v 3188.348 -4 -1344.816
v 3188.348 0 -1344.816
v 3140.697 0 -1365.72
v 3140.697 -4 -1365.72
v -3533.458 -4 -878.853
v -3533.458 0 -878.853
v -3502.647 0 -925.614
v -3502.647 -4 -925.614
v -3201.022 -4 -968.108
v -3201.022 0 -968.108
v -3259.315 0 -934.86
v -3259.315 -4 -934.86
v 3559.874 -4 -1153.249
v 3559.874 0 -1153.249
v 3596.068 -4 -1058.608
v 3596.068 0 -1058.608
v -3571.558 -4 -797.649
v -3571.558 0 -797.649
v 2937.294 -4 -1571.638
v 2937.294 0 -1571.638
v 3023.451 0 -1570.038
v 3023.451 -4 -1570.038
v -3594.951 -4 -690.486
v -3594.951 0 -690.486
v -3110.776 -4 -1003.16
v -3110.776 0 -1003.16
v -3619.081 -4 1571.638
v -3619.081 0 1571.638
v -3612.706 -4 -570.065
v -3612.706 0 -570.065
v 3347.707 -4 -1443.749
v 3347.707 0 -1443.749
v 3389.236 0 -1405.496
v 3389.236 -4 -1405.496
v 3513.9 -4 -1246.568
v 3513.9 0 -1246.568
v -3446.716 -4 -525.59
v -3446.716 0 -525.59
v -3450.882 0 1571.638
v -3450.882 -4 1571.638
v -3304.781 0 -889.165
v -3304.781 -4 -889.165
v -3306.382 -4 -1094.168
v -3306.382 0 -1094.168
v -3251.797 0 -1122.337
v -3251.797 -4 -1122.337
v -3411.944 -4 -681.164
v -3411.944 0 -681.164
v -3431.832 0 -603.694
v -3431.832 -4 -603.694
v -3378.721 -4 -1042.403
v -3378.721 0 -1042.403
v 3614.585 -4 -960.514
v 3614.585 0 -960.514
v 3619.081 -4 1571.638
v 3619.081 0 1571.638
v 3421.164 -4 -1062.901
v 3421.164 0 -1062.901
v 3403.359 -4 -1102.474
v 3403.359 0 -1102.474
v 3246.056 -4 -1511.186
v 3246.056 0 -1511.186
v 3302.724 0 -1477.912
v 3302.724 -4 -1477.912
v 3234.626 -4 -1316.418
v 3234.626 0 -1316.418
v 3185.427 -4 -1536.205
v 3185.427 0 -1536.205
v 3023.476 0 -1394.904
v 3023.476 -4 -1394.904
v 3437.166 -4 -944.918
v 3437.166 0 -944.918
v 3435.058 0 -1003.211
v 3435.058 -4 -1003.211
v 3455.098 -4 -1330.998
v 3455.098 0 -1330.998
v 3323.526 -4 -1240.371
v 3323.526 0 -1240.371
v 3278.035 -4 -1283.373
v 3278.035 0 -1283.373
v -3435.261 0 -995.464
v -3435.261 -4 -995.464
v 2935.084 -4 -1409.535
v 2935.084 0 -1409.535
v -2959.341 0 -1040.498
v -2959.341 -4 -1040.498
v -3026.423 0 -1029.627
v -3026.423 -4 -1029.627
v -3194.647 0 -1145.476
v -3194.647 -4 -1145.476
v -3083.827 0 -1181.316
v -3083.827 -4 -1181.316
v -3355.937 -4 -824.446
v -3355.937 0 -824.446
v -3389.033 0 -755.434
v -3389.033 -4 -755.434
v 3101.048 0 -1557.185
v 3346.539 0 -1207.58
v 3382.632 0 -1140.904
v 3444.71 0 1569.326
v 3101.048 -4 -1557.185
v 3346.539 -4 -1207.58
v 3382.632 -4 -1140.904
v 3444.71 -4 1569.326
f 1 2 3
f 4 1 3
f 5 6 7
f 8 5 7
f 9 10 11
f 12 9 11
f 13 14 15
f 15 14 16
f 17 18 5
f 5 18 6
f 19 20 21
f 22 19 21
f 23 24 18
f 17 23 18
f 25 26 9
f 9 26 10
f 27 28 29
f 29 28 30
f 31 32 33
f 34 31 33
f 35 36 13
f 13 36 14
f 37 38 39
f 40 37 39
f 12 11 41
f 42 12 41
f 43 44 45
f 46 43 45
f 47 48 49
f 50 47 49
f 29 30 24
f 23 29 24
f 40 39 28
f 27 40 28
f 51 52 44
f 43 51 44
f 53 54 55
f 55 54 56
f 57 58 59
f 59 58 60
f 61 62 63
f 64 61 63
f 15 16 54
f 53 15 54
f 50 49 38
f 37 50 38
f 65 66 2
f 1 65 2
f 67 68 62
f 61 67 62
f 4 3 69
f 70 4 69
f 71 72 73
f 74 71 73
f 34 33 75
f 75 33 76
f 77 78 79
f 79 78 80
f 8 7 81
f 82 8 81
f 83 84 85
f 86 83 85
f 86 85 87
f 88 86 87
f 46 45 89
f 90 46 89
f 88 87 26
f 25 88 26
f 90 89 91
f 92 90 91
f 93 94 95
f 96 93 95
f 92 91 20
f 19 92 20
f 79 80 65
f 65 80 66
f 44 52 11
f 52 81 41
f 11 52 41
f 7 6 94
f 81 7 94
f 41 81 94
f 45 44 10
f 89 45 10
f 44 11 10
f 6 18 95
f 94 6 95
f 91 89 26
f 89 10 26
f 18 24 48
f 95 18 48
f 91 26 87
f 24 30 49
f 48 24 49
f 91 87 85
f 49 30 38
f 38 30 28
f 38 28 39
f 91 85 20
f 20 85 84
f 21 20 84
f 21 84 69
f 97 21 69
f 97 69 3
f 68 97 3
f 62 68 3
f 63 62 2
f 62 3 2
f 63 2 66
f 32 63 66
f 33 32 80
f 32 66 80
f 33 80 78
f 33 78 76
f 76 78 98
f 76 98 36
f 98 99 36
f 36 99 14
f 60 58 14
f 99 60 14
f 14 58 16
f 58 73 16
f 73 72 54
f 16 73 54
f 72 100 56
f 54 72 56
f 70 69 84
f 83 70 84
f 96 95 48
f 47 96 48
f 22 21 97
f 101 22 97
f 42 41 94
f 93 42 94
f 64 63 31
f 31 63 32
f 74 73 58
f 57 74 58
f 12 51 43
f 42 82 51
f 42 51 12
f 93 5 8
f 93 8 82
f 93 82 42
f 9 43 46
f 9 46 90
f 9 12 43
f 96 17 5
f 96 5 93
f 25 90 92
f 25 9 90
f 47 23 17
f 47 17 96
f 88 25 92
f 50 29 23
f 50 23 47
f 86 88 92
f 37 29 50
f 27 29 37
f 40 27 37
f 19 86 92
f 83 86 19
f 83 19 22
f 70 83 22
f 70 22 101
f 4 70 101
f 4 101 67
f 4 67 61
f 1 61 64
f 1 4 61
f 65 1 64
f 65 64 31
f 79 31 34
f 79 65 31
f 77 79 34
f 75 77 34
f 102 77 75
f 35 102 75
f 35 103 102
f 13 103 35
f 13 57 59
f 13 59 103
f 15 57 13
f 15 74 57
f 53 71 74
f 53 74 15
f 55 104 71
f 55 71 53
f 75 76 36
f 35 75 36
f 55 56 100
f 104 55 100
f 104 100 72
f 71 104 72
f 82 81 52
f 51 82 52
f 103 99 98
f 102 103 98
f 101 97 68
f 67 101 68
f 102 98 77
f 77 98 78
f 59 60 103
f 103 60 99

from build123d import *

# Parameters (mm, degrees)
F1_DEPTH = 4


with BuildPart() as f1:
    # F0 (on Front) → F1 (new body)
    with BuildSketch(Plane.XZ):
        Polygon((-3450.8821, 1571.6377), (-3619.0809, 1571.6377), (-3612.7055, -570.0649), (-3594.9509, -690.4863), (-3571.5575, -797.6489), (-3533.4575, -878.8527), (-3502.6473, -925.6141), (-3435.2611, -995.4641), (-3378.7207, -1042.4033), (-3306.3815, -1094.1685), (-3251.7969, -1122.3371), (-3194.6469, -1145.4765), (-3083.8267, -1181.3159), (2937.2941, -1571.6377), (3023.4509, -1570.0375), (3101.0479, -1557.1851), (3185.4267, -1536.2047), (3246.0565, -1511.1857), (3302.7239, -1477.9117), (3347.7073, -1443.7487), (3389.2363, -1405.4963), (3455.0985, -1330.9981), (3513.8995, -1246.5685), (3559.8735, -1153.2489), (3596.0685, -1058.6085), (3614.5851, -960.5137), (3619.0809, 1571.6377), (3444.7099, 1569.3263), (3437.1661, -944.9181), (3435.0579, -1003.2111), (3421.1641, -1062.9011), (3403.3587, -1102.4743), (3382.6323, -1140.9045), (3346.5389, -1207.5795), (3323.5265, -1240.3709), (3278.0351, -1283.3731), (3234.6265, -1316.4185), (3188.3477, -1344.8157), (3140.6973, -1365.7199), (3023.4763, -1394.9045), (2935.0843, -1409.5349), (-2959.3413, -1040.4983), (-3026.4227, -1029.6271), (-3110.7761, -1003.1603), (-3201.0223, -968.1083), (-3259.3153, -934.8597), (-3304.7813, -889.1651), (-3355.9369, -824.4459), (-3389.0331, -755.4341), (-3411.9439, -681.1645), (-3431.8321, -603.6945), (-3446.7165, -525.5895), align=None)
    extrude(amount=F1_DEPTH)


solid = f1.part
